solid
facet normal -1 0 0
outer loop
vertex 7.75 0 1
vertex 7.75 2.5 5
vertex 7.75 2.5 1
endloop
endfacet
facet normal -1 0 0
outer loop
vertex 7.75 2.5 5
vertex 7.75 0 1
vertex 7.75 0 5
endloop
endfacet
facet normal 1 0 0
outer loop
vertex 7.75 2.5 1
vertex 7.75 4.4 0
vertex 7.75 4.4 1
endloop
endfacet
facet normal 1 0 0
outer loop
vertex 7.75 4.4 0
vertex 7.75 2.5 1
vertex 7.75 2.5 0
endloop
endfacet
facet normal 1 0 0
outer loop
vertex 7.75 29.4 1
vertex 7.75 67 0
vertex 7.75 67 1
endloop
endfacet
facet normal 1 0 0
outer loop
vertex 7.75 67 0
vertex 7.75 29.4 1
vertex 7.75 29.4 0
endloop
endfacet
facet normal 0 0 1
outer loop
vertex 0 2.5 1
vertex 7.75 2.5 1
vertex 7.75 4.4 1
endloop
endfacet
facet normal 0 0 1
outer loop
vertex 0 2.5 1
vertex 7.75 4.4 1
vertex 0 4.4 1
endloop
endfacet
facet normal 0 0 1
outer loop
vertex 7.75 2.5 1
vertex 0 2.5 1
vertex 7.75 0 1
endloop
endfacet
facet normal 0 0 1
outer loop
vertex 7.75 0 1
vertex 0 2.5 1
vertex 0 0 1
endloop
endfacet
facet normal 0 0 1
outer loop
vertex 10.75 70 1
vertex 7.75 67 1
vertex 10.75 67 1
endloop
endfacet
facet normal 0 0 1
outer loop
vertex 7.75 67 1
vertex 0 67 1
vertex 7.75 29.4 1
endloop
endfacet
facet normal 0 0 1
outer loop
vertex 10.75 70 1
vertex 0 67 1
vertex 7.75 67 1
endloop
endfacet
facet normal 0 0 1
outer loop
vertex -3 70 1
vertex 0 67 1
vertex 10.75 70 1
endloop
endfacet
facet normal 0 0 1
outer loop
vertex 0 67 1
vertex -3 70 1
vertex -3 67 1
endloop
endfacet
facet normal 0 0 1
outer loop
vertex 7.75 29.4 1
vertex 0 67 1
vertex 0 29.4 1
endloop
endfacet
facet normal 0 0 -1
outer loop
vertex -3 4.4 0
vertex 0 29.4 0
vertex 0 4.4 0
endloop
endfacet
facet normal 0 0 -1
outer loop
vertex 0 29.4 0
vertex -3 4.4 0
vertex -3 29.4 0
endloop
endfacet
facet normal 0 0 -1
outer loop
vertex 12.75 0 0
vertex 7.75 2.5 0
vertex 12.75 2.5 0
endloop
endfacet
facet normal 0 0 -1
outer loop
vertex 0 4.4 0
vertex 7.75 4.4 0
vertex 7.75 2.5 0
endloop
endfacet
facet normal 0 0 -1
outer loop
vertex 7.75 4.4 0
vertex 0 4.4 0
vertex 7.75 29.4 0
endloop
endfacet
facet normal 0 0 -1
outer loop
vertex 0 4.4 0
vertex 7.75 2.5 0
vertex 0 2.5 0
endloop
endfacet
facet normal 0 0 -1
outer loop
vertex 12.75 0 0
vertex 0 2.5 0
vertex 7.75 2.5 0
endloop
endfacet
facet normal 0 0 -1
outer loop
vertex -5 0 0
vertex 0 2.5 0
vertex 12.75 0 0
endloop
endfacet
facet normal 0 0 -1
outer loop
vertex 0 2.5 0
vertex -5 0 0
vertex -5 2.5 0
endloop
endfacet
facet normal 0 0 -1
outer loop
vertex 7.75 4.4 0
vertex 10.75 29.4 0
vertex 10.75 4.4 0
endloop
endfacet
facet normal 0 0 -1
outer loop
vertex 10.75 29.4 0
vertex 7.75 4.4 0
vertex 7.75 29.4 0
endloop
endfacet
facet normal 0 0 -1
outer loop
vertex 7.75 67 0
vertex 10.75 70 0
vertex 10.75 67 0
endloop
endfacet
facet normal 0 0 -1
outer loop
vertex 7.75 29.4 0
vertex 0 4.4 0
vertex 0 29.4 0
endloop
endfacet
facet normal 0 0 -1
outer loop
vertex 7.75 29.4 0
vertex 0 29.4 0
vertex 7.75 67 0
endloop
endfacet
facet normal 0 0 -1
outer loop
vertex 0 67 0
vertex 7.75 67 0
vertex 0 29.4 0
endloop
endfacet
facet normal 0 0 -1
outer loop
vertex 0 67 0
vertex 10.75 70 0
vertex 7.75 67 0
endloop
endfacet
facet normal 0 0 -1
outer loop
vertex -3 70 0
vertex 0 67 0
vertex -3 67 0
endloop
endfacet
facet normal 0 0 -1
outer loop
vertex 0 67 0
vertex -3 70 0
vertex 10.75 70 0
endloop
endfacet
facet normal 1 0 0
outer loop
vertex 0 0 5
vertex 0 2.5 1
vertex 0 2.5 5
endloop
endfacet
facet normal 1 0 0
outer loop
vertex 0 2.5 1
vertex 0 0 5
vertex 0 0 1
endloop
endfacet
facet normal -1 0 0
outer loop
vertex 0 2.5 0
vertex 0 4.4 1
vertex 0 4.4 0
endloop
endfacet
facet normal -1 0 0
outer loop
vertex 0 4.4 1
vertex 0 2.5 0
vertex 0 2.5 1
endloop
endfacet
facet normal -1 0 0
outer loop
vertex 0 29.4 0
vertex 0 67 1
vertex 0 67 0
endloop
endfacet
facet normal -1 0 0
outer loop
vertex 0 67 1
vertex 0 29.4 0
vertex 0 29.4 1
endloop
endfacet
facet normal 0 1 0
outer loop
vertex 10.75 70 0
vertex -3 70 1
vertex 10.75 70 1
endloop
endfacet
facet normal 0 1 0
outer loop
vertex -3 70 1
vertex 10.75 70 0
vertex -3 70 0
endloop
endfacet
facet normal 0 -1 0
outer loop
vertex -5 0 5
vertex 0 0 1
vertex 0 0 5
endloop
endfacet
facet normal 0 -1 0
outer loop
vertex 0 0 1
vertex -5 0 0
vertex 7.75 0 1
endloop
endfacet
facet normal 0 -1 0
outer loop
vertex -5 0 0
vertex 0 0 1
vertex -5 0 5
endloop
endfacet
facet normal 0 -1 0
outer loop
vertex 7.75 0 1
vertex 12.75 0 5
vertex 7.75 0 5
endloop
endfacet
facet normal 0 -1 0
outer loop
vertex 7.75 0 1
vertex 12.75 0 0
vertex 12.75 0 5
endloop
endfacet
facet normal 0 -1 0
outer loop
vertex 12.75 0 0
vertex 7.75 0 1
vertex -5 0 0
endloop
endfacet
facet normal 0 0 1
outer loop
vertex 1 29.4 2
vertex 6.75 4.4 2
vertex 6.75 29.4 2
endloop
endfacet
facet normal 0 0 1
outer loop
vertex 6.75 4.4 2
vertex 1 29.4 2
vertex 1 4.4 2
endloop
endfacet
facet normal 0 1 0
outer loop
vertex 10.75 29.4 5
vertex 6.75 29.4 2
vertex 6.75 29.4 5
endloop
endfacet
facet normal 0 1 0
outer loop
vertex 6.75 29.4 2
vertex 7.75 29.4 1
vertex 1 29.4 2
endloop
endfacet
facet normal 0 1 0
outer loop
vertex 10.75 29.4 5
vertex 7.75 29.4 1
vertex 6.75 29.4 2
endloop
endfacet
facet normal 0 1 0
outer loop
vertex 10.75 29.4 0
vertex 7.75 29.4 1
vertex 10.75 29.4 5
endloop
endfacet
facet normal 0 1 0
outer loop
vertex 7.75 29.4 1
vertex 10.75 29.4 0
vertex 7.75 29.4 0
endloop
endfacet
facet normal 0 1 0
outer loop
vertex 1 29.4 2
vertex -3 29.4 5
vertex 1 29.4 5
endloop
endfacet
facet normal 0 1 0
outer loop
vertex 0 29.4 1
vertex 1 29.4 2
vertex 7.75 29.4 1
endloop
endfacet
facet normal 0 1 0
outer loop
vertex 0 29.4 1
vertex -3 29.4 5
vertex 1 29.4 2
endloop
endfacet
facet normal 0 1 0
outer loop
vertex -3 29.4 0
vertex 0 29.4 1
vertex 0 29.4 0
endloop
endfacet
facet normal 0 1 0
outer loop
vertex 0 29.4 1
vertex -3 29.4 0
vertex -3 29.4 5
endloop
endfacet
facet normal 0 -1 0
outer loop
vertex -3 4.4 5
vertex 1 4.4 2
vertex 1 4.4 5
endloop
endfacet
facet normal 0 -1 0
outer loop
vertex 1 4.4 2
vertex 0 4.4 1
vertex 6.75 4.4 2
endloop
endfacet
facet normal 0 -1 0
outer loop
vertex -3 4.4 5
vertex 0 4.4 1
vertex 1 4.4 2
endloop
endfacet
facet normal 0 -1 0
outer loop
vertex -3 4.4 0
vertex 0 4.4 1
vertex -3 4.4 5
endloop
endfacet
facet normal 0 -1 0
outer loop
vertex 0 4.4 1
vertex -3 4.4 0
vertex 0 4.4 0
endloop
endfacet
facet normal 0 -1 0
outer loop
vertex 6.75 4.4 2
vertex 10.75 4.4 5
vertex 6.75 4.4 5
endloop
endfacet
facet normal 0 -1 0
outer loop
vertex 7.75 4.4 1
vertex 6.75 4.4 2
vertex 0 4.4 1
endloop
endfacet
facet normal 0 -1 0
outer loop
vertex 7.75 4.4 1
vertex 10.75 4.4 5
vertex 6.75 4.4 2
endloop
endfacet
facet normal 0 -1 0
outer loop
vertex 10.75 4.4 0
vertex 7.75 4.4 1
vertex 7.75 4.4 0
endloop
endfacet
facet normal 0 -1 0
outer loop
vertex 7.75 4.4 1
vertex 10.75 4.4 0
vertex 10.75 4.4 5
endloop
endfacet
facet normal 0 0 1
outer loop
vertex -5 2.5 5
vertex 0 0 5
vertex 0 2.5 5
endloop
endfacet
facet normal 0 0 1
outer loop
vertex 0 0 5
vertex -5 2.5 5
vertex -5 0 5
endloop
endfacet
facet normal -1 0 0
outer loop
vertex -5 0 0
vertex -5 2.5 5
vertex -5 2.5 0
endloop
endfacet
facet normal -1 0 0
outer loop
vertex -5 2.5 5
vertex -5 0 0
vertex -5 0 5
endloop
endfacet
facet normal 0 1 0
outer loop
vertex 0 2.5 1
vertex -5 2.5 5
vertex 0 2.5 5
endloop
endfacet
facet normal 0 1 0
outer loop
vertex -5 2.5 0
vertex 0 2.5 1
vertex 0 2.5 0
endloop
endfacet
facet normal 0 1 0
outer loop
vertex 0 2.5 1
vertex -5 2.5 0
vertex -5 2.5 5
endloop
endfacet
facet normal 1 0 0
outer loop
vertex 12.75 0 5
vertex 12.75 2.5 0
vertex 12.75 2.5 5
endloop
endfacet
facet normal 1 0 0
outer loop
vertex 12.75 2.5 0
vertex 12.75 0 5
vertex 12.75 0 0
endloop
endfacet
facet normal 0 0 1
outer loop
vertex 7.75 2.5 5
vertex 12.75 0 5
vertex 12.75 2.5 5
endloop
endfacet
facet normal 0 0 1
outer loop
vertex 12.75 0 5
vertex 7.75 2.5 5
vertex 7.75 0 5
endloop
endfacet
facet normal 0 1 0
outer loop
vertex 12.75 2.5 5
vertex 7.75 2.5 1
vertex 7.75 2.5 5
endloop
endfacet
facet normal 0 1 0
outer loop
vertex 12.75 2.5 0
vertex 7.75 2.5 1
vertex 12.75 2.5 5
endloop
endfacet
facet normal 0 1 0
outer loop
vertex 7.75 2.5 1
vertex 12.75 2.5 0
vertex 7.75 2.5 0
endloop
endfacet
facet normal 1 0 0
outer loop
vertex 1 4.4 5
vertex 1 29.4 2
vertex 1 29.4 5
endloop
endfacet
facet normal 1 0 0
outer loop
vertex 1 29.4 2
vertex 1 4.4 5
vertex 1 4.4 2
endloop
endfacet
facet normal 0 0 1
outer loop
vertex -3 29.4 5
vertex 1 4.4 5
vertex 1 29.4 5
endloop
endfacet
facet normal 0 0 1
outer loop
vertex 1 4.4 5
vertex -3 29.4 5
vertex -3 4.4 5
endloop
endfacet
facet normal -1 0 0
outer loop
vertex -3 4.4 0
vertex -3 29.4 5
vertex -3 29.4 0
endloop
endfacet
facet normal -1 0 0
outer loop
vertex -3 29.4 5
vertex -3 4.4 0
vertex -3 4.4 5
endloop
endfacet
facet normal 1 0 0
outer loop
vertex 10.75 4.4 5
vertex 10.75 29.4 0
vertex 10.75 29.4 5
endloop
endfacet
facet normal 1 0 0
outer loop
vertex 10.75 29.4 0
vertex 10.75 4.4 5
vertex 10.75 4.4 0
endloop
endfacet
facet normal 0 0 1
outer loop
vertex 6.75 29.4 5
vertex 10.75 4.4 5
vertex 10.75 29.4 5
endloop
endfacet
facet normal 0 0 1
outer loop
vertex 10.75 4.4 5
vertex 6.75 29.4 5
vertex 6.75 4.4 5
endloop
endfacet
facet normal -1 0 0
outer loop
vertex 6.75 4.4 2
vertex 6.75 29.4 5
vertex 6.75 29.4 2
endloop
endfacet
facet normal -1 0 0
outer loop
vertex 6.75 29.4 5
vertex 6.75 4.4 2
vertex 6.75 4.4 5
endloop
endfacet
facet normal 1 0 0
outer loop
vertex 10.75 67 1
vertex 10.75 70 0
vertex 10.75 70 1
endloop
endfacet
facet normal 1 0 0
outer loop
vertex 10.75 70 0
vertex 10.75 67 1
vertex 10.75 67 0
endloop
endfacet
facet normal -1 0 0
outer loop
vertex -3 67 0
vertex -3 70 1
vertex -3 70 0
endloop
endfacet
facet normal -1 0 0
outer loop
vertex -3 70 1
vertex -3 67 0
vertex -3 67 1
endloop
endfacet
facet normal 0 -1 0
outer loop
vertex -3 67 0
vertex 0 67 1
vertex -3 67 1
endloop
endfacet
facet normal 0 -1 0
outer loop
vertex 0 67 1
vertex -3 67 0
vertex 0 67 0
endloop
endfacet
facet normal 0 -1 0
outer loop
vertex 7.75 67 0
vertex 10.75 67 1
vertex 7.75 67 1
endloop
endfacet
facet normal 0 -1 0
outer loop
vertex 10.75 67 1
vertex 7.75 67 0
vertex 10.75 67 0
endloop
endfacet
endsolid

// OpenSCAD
gap = 0.25;

width_6p = 7.5;
width_40p = 24.5;

module helper(body_width){
    handler_length = 70;
    guide_length = 25;
    block_size = 3;
    lower_block_size = 5;
    block_zheight = 5;
    inset = 1;
    connector_base_height = 2.5;
    thickness = 1;
    primer_handle_thickness = 1.65 + gap;
    primer_thickness = 1;

    cube([body_width, handler_length, thickness]);
    translate([0,connector_base_height+primer_handle_thickness,thickness]) cube([body_width,guide_length,primer_thickness]);    
    
    translate([-lower_block_size,0,0]) cube([lower_block_size,connector_base_height,block_zheight]);
    translate([body_width,0,0]) cube([lower_block_size,connector_base_height,block_zheight]);

    translate([-block_size,connector_base_height+primer_handle_thickness,0]) cube([block_size+inset,guide_length,block_zheight]);
    translate([body_width-inset,connector_base_height+primer_handle_thickness,0]) cube([block_size+inset,guide_length,block_zheight]);

    translate([-block_size, handler_length-block_size, 0]) cube([body_width+block_size*2,block_size,thickness]);
}

helper(width_6p + gap);
